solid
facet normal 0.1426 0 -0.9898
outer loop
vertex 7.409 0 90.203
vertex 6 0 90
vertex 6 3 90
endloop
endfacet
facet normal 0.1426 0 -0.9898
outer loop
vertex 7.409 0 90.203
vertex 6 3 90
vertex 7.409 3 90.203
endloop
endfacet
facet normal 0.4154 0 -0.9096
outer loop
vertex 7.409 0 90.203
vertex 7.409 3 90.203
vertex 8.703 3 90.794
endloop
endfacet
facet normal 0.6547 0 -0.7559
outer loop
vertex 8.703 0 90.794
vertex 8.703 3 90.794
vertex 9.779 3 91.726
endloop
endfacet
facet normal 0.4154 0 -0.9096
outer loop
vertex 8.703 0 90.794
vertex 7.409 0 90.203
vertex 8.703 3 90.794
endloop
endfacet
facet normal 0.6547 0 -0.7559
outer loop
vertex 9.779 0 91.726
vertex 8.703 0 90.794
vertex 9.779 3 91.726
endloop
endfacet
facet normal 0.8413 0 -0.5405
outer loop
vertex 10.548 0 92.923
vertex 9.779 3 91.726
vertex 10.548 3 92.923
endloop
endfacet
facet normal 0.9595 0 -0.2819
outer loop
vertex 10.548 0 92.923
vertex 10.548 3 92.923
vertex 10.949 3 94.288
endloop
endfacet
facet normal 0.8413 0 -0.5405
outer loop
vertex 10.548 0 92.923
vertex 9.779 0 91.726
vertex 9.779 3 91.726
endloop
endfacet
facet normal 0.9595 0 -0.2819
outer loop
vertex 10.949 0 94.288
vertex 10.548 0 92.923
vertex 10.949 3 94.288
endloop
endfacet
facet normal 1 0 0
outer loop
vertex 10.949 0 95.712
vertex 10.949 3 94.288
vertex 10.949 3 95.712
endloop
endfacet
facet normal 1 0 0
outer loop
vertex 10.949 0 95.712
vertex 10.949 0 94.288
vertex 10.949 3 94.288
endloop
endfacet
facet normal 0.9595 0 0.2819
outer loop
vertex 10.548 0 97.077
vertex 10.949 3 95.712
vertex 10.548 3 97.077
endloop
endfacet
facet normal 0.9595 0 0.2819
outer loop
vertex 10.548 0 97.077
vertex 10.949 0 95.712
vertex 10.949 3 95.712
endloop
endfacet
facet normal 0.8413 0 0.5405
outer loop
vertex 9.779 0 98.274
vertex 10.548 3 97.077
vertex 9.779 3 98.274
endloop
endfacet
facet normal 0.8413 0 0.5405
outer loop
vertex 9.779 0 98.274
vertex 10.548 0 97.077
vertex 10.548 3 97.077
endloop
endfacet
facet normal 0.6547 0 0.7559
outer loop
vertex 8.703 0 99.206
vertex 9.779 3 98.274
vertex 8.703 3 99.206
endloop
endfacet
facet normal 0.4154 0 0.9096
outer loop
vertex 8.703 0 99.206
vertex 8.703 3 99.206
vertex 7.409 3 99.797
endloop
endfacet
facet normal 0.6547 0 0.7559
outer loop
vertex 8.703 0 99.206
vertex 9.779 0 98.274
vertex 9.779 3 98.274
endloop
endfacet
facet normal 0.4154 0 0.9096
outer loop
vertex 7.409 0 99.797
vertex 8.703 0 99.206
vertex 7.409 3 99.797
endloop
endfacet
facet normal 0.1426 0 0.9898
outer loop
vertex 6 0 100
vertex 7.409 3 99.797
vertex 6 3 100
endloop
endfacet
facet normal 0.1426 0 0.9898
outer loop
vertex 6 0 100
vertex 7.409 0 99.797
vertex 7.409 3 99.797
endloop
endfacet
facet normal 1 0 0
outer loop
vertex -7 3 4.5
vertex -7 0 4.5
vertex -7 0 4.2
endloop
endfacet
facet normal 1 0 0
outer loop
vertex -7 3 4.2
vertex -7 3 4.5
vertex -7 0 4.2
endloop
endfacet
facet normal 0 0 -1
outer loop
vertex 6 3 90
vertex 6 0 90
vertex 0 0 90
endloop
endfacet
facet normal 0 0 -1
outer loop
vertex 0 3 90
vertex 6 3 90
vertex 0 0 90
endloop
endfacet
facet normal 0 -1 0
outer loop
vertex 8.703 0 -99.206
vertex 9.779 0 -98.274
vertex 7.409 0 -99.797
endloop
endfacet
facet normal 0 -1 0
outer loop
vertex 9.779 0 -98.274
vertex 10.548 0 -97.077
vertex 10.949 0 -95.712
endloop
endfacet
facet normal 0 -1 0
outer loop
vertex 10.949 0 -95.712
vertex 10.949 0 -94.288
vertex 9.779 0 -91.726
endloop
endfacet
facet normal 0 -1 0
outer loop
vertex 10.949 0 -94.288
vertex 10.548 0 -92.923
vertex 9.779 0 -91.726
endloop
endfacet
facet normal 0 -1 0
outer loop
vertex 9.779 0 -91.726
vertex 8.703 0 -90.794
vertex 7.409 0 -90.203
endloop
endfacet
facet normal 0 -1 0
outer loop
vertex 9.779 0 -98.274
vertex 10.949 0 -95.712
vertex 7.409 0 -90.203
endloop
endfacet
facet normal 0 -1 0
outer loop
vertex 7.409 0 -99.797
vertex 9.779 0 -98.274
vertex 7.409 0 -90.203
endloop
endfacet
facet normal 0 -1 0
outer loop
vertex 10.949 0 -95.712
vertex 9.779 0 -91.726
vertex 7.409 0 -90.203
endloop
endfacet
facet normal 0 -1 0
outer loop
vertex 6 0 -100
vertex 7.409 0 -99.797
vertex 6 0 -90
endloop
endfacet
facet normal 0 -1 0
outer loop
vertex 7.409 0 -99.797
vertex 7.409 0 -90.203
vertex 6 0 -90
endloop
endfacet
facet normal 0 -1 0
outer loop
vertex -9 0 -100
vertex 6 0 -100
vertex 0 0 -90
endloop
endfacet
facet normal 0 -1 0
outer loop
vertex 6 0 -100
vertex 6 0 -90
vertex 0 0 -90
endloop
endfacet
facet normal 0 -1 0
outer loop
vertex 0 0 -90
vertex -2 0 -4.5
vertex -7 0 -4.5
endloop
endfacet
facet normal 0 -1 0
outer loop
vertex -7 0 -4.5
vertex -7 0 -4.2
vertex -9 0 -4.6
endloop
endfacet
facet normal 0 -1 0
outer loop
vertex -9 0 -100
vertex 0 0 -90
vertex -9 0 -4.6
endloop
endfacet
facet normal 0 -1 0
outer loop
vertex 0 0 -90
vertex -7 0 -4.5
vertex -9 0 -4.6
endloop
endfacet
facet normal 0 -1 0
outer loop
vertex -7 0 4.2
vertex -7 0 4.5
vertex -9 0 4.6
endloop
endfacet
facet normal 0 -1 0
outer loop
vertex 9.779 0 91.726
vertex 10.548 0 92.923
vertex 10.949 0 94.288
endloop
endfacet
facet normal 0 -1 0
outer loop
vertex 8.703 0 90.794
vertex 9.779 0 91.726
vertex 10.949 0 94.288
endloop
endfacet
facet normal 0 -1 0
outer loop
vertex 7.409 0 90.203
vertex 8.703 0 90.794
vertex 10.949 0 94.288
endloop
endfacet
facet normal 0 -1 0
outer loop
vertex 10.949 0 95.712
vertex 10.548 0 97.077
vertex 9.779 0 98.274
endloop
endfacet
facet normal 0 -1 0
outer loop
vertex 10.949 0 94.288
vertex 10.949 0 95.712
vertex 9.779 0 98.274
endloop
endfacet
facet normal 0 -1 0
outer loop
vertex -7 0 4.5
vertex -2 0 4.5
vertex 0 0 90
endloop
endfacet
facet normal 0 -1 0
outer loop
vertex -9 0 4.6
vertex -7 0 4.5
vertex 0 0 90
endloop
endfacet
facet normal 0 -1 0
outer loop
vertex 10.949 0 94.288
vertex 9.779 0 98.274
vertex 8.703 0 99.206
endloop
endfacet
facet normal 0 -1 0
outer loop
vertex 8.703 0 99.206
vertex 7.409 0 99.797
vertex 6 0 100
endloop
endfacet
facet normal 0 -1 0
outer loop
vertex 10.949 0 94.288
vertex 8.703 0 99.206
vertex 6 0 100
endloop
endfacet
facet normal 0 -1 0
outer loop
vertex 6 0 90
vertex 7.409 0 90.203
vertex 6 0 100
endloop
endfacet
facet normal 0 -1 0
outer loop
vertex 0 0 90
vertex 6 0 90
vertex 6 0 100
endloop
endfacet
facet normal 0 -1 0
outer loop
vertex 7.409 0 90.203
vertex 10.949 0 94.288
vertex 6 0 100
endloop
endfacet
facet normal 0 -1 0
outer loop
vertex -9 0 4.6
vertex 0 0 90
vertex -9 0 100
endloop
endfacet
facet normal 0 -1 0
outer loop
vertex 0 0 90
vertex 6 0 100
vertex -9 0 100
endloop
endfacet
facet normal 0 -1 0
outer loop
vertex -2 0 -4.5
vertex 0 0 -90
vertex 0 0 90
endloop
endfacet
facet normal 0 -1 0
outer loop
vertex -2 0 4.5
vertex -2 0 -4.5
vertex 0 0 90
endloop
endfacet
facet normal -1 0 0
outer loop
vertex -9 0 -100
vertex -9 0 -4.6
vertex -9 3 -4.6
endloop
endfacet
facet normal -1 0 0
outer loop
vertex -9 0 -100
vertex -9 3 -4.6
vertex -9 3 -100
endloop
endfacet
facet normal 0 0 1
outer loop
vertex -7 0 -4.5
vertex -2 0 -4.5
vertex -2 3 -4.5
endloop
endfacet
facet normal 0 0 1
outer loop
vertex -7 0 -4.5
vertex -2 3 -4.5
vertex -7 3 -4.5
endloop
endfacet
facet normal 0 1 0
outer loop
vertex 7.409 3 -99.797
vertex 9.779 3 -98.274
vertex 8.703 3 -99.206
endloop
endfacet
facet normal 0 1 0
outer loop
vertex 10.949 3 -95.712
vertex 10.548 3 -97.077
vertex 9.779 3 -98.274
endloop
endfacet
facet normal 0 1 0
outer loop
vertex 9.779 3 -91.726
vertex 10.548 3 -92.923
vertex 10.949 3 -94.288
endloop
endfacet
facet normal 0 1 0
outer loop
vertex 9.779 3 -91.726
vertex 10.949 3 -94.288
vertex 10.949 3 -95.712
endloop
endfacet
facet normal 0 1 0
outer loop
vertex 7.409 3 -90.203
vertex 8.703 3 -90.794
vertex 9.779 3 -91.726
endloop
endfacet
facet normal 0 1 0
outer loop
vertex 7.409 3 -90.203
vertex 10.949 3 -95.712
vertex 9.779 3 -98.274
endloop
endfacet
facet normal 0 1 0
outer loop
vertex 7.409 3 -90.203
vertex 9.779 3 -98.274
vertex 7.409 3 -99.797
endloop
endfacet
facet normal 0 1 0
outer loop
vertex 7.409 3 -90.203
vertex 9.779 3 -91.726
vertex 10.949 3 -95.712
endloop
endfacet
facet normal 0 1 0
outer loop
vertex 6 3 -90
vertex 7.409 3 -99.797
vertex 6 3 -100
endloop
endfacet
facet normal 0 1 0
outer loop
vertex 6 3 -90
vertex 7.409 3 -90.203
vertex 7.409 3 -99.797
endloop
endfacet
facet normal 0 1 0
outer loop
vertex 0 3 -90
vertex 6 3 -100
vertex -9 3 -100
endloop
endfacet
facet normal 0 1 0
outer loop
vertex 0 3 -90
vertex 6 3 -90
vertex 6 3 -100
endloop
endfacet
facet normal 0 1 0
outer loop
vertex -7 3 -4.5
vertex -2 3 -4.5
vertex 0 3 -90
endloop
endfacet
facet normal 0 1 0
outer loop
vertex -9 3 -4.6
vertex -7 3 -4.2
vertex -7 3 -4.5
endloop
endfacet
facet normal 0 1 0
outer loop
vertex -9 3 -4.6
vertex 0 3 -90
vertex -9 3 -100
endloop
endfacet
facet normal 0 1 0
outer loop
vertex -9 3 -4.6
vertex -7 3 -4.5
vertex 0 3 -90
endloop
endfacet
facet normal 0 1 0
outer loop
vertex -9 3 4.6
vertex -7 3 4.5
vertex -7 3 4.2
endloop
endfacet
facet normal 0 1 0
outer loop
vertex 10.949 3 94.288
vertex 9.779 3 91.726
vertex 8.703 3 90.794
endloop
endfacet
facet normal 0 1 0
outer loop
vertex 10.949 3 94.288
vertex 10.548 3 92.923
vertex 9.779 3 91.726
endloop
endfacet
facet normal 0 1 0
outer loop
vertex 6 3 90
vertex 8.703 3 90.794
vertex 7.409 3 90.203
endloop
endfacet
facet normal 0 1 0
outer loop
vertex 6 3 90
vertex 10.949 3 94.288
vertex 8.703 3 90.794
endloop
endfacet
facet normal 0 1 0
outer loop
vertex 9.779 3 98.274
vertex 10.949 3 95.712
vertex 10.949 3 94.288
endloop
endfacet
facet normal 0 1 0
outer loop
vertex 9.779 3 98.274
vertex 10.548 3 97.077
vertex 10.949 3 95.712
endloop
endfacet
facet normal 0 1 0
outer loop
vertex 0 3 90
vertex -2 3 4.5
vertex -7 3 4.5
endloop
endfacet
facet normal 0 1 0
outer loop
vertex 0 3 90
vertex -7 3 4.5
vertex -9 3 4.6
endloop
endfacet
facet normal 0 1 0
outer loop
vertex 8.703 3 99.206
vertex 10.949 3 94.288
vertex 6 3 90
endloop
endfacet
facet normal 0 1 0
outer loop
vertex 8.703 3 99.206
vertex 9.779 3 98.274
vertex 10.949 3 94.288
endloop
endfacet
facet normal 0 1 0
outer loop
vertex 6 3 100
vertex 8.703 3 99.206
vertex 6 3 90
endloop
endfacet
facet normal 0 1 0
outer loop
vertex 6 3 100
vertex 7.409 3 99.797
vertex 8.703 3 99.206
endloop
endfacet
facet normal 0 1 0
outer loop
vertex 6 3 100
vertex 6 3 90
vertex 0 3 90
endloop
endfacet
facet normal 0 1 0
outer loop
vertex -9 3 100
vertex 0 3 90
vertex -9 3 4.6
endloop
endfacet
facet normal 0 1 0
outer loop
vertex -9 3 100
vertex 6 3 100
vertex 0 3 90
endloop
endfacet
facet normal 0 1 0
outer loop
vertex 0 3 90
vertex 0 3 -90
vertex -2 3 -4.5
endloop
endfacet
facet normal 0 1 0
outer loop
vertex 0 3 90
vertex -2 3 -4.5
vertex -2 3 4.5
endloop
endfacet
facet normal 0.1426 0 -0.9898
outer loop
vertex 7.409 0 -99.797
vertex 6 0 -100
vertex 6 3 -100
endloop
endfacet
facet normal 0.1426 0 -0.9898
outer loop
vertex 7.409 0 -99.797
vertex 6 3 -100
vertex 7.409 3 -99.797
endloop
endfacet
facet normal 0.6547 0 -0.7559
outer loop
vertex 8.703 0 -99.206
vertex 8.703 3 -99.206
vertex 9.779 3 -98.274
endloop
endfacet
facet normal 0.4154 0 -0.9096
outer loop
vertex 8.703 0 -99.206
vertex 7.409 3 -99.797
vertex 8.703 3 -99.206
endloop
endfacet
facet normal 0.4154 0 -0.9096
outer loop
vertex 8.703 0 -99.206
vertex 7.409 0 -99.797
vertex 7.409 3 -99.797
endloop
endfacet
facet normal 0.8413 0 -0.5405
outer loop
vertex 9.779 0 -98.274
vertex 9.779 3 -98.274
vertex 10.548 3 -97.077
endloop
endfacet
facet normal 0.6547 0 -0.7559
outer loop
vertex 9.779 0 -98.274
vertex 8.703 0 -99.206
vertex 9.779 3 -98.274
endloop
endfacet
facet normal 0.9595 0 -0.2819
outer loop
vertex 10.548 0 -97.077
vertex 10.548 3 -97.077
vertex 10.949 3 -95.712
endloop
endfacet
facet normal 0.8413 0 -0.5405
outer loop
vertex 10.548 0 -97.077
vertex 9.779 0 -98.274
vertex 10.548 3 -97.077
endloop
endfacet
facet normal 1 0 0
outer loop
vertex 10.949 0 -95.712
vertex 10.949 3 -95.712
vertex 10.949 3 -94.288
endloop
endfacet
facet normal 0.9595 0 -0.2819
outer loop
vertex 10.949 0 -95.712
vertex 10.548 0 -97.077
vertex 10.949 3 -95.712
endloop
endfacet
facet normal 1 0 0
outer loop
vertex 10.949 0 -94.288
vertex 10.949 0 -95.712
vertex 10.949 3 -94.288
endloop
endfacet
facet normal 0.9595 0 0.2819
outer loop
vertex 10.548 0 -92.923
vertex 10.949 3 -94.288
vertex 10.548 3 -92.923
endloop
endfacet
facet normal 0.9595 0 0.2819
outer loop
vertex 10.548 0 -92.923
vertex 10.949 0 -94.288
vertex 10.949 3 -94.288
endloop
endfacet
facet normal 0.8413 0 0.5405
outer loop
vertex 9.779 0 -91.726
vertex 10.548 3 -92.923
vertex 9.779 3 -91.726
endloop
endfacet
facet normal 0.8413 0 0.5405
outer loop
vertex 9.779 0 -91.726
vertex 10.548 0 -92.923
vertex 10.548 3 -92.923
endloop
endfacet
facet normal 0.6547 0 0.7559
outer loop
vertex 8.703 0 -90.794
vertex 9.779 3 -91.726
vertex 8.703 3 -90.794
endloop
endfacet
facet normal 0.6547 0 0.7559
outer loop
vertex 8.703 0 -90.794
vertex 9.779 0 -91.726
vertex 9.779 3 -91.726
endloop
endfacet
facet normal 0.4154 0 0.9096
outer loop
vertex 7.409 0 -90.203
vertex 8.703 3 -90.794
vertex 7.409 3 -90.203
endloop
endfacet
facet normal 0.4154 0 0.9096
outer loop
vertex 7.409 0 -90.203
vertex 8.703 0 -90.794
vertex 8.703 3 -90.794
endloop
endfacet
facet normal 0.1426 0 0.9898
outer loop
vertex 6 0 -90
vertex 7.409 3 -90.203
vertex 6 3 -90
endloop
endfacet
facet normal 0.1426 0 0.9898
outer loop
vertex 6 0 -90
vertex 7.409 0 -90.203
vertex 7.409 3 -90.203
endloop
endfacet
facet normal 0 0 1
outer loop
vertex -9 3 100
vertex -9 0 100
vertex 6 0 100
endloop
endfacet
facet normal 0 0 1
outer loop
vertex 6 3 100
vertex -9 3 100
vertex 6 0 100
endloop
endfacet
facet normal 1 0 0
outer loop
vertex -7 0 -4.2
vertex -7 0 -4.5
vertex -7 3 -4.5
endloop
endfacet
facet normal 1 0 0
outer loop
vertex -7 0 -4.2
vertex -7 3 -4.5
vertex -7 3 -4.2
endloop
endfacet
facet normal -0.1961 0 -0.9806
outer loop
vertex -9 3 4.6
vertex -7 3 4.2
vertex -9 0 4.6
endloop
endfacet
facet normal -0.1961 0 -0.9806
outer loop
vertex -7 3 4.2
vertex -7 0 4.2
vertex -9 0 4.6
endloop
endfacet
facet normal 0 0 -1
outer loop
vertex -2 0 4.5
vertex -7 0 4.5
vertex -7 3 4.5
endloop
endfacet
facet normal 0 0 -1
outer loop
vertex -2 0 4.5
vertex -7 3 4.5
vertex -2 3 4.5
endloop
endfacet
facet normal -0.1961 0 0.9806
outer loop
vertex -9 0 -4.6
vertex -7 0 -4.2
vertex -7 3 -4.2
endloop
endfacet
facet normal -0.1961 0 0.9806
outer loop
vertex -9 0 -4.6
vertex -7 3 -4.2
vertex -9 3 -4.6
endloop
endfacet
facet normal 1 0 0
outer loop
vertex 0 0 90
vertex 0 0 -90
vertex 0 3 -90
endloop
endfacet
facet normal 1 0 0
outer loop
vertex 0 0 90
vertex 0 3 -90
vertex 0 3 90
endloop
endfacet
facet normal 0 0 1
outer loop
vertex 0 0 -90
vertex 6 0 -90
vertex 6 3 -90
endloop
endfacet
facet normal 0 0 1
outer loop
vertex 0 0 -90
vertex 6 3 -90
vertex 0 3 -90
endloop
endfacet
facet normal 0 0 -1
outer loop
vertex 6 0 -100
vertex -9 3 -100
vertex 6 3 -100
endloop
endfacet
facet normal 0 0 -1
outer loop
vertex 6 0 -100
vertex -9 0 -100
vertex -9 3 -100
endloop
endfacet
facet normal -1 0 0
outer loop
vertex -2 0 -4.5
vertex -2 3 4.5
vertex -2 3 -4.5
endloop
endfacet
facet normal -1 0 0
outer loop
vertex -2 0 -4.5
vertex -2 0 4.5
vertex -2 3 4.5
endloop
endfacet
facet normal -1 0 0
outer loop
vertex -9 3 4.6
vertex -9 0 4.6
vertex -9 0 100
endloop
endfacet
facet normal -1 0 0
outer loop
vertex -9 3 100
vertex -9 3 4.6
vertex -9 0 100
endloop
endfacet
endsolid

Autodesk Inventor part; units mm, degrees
ref_plane "YZ Plane" through (0, 0, 0) normal (1, 0, 0) x (0, 1, 0)
ref_plane "XZ Plane" through (0, 0, 0) normal (0, 1, 0) x (-1, 0, 0)
ref_plane "XY Plane" through (0, 0, 0) normal (0, 0, 1) x (1, 0, 0)
sketch "草圖1" plane through (0, 0, 0) normal (0, 1, 0) x (-1, 0, 0)
  line L0 (0, 90) -> (9, 90)
  line L1 (9, -90) -> (0, -90)
  line L2 (0, -90) -> (0, 90)
  line L3 (7, 4.5) -> (2, 4.5)
  line L4 (2, 4.5) -> (2, -4.5)
  line L5 (2, -4.5) -> (7, -4.5)
  line L6 (9, 90) -> (9, 100)
  line L7 (9, 100) -> (-6, 100)
  line L8 (-11, 95) -> (-11, 95)
  line L9 (-6, 90) -> (0, 90)
  arc A0 (-11, 95) -> (-6, 90) centre (-6, 95) ccw
  arc A1 (-6, 100) -> (-11, 95) centre (-6, 95) ccw
  circle A2 centre (-6, 95) radius 2.5
  line L10 (9, 0) -> (0, 0)
  line L11 (9, -90) -> (9, -100)
  line L12 (9, -100) -> (-6, -100)
  line L13 (-6, -90) -> (0, -90)
  arc A3 (-6, -90) -> (-11, -95) centre (-6, -95) ccw
  arc A4 (-11, -95) -> (-6, -100) centre (-6, -95) ccw
  circle A5 centre (-6, -95) radius 2.5
  line L14 (9, 90) -> (9, 4.6)
  line L15 (9, -4.6) -> (9, -90)
  line L16 (7, -4.5) -> (7, -4.2)
  line L17 (7, -4.2) -> (9, -4.6)
  line L18 (7, 4.5) -> (7, 4.2)
  line L19 (7, 4.2) -> (9, 4.6)
  point P0 (4.5, 4.5)
  point P1 (4.5, 90)
  point P2 (-11, 100)
  point P3 (-11, -100)
  point P4 (2, 0)
  dimension "d0" = 180
  dimension "d1" = 9
  dimension "d3" = 5
  dimension "d4" = 10
  dimension "d5" = 20
  dimension "d6" = 5
  dimension "d7" = 5
  dimension "d8" = 5
  dimension "d11" = 85.4
  dimension "d12" = 85.4
  dimension "d13" = 9
  dimension "d14" = 0.3
  dimension "d15" = 0.3
  dimension "d16" = 11.31
  dimension "d17" = 0
  dimension "d18" = 5
  dimension "d19" = 20
  dimension "d20" = 185
  dimension "d21" = 20
extrude "擠出1" add sketch "草圖1" along normal blind 3 contours L9 A0 A1 L7 L6 L0 | L0 L14 L19 L18 L3 L4 L10 L2 | L10 L4 L5 L16 L17 L15 L1 L2 | L1 L11 L12 A4 A3 L13 | A2 | A5
properties part number "Lower_Bar_3"
